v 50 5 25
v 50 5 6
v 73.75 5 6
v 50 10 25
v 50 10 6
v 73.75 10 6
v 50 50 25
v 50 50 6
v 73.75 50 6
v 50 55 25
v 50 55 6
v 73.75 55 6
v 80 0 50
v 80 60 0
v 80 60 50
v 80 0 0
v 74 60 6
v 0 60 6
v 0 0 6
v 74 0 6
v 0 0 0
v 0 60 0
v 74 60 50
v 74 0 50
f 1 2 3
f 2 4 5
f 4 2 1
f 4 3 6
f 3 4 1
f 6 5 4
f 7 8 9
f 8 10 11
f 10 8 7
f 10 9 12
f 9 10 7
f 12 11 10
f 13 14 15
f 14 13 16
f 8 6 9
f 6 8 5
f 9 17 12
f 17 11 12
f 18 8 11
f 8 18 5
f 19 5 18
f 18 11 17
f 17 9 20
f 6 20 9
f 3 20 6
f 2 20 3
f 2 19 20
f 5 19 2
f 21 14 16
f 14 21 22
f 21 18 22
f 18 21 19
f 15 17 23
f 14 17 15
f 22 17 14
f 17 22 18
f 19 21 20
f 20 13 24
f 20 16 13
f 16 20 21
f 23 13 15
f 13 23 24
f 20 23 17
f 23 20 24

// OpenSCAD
$fn = 32;

// ----------------------------------------------------------------------
// Rib bracket: 2-gusset L bracket
// ----------------------------------------------------------------------

// --- parameters (mm) ---
base_l = 80;              // foot length, X
base_w = 60;              // foot width, Y
base_t = 6;               // foot thickness
plate_t = 6;              // upright plate thickness
plate_h = 50;             // overall height
gus_l = 24;               // gusset leg along the foot
gus_h = 20;               // gusset height
gus_t = 5;                // gusset thickness
gus_edge = 5;             // gusset margin from the foot edge
n_gus = 2;                // gusset count

gus_pitch = (base_w - 2 * gus_edge - gus_t) / (n_gus - 1);  // gusset pitch

union() {
  cube([base_l, base_w, base_t]);
  translate([base_l - plate_t, 0, base_t - 1])
    cube([plate_t, base_w, plate_h - base_t + 1]);
  for (i = [0 : n_gus - 1])
    translate([base_l - plate_t - gus_l, gus_edge + i * gus_pitch, base_t - 1])
      rotate([-90, 0, 0])
        linear_extrude(height = gus_t)
          polygon(points = [[0, 0], [gus_l + 1, 0], [0, -gus_h]]);
}
